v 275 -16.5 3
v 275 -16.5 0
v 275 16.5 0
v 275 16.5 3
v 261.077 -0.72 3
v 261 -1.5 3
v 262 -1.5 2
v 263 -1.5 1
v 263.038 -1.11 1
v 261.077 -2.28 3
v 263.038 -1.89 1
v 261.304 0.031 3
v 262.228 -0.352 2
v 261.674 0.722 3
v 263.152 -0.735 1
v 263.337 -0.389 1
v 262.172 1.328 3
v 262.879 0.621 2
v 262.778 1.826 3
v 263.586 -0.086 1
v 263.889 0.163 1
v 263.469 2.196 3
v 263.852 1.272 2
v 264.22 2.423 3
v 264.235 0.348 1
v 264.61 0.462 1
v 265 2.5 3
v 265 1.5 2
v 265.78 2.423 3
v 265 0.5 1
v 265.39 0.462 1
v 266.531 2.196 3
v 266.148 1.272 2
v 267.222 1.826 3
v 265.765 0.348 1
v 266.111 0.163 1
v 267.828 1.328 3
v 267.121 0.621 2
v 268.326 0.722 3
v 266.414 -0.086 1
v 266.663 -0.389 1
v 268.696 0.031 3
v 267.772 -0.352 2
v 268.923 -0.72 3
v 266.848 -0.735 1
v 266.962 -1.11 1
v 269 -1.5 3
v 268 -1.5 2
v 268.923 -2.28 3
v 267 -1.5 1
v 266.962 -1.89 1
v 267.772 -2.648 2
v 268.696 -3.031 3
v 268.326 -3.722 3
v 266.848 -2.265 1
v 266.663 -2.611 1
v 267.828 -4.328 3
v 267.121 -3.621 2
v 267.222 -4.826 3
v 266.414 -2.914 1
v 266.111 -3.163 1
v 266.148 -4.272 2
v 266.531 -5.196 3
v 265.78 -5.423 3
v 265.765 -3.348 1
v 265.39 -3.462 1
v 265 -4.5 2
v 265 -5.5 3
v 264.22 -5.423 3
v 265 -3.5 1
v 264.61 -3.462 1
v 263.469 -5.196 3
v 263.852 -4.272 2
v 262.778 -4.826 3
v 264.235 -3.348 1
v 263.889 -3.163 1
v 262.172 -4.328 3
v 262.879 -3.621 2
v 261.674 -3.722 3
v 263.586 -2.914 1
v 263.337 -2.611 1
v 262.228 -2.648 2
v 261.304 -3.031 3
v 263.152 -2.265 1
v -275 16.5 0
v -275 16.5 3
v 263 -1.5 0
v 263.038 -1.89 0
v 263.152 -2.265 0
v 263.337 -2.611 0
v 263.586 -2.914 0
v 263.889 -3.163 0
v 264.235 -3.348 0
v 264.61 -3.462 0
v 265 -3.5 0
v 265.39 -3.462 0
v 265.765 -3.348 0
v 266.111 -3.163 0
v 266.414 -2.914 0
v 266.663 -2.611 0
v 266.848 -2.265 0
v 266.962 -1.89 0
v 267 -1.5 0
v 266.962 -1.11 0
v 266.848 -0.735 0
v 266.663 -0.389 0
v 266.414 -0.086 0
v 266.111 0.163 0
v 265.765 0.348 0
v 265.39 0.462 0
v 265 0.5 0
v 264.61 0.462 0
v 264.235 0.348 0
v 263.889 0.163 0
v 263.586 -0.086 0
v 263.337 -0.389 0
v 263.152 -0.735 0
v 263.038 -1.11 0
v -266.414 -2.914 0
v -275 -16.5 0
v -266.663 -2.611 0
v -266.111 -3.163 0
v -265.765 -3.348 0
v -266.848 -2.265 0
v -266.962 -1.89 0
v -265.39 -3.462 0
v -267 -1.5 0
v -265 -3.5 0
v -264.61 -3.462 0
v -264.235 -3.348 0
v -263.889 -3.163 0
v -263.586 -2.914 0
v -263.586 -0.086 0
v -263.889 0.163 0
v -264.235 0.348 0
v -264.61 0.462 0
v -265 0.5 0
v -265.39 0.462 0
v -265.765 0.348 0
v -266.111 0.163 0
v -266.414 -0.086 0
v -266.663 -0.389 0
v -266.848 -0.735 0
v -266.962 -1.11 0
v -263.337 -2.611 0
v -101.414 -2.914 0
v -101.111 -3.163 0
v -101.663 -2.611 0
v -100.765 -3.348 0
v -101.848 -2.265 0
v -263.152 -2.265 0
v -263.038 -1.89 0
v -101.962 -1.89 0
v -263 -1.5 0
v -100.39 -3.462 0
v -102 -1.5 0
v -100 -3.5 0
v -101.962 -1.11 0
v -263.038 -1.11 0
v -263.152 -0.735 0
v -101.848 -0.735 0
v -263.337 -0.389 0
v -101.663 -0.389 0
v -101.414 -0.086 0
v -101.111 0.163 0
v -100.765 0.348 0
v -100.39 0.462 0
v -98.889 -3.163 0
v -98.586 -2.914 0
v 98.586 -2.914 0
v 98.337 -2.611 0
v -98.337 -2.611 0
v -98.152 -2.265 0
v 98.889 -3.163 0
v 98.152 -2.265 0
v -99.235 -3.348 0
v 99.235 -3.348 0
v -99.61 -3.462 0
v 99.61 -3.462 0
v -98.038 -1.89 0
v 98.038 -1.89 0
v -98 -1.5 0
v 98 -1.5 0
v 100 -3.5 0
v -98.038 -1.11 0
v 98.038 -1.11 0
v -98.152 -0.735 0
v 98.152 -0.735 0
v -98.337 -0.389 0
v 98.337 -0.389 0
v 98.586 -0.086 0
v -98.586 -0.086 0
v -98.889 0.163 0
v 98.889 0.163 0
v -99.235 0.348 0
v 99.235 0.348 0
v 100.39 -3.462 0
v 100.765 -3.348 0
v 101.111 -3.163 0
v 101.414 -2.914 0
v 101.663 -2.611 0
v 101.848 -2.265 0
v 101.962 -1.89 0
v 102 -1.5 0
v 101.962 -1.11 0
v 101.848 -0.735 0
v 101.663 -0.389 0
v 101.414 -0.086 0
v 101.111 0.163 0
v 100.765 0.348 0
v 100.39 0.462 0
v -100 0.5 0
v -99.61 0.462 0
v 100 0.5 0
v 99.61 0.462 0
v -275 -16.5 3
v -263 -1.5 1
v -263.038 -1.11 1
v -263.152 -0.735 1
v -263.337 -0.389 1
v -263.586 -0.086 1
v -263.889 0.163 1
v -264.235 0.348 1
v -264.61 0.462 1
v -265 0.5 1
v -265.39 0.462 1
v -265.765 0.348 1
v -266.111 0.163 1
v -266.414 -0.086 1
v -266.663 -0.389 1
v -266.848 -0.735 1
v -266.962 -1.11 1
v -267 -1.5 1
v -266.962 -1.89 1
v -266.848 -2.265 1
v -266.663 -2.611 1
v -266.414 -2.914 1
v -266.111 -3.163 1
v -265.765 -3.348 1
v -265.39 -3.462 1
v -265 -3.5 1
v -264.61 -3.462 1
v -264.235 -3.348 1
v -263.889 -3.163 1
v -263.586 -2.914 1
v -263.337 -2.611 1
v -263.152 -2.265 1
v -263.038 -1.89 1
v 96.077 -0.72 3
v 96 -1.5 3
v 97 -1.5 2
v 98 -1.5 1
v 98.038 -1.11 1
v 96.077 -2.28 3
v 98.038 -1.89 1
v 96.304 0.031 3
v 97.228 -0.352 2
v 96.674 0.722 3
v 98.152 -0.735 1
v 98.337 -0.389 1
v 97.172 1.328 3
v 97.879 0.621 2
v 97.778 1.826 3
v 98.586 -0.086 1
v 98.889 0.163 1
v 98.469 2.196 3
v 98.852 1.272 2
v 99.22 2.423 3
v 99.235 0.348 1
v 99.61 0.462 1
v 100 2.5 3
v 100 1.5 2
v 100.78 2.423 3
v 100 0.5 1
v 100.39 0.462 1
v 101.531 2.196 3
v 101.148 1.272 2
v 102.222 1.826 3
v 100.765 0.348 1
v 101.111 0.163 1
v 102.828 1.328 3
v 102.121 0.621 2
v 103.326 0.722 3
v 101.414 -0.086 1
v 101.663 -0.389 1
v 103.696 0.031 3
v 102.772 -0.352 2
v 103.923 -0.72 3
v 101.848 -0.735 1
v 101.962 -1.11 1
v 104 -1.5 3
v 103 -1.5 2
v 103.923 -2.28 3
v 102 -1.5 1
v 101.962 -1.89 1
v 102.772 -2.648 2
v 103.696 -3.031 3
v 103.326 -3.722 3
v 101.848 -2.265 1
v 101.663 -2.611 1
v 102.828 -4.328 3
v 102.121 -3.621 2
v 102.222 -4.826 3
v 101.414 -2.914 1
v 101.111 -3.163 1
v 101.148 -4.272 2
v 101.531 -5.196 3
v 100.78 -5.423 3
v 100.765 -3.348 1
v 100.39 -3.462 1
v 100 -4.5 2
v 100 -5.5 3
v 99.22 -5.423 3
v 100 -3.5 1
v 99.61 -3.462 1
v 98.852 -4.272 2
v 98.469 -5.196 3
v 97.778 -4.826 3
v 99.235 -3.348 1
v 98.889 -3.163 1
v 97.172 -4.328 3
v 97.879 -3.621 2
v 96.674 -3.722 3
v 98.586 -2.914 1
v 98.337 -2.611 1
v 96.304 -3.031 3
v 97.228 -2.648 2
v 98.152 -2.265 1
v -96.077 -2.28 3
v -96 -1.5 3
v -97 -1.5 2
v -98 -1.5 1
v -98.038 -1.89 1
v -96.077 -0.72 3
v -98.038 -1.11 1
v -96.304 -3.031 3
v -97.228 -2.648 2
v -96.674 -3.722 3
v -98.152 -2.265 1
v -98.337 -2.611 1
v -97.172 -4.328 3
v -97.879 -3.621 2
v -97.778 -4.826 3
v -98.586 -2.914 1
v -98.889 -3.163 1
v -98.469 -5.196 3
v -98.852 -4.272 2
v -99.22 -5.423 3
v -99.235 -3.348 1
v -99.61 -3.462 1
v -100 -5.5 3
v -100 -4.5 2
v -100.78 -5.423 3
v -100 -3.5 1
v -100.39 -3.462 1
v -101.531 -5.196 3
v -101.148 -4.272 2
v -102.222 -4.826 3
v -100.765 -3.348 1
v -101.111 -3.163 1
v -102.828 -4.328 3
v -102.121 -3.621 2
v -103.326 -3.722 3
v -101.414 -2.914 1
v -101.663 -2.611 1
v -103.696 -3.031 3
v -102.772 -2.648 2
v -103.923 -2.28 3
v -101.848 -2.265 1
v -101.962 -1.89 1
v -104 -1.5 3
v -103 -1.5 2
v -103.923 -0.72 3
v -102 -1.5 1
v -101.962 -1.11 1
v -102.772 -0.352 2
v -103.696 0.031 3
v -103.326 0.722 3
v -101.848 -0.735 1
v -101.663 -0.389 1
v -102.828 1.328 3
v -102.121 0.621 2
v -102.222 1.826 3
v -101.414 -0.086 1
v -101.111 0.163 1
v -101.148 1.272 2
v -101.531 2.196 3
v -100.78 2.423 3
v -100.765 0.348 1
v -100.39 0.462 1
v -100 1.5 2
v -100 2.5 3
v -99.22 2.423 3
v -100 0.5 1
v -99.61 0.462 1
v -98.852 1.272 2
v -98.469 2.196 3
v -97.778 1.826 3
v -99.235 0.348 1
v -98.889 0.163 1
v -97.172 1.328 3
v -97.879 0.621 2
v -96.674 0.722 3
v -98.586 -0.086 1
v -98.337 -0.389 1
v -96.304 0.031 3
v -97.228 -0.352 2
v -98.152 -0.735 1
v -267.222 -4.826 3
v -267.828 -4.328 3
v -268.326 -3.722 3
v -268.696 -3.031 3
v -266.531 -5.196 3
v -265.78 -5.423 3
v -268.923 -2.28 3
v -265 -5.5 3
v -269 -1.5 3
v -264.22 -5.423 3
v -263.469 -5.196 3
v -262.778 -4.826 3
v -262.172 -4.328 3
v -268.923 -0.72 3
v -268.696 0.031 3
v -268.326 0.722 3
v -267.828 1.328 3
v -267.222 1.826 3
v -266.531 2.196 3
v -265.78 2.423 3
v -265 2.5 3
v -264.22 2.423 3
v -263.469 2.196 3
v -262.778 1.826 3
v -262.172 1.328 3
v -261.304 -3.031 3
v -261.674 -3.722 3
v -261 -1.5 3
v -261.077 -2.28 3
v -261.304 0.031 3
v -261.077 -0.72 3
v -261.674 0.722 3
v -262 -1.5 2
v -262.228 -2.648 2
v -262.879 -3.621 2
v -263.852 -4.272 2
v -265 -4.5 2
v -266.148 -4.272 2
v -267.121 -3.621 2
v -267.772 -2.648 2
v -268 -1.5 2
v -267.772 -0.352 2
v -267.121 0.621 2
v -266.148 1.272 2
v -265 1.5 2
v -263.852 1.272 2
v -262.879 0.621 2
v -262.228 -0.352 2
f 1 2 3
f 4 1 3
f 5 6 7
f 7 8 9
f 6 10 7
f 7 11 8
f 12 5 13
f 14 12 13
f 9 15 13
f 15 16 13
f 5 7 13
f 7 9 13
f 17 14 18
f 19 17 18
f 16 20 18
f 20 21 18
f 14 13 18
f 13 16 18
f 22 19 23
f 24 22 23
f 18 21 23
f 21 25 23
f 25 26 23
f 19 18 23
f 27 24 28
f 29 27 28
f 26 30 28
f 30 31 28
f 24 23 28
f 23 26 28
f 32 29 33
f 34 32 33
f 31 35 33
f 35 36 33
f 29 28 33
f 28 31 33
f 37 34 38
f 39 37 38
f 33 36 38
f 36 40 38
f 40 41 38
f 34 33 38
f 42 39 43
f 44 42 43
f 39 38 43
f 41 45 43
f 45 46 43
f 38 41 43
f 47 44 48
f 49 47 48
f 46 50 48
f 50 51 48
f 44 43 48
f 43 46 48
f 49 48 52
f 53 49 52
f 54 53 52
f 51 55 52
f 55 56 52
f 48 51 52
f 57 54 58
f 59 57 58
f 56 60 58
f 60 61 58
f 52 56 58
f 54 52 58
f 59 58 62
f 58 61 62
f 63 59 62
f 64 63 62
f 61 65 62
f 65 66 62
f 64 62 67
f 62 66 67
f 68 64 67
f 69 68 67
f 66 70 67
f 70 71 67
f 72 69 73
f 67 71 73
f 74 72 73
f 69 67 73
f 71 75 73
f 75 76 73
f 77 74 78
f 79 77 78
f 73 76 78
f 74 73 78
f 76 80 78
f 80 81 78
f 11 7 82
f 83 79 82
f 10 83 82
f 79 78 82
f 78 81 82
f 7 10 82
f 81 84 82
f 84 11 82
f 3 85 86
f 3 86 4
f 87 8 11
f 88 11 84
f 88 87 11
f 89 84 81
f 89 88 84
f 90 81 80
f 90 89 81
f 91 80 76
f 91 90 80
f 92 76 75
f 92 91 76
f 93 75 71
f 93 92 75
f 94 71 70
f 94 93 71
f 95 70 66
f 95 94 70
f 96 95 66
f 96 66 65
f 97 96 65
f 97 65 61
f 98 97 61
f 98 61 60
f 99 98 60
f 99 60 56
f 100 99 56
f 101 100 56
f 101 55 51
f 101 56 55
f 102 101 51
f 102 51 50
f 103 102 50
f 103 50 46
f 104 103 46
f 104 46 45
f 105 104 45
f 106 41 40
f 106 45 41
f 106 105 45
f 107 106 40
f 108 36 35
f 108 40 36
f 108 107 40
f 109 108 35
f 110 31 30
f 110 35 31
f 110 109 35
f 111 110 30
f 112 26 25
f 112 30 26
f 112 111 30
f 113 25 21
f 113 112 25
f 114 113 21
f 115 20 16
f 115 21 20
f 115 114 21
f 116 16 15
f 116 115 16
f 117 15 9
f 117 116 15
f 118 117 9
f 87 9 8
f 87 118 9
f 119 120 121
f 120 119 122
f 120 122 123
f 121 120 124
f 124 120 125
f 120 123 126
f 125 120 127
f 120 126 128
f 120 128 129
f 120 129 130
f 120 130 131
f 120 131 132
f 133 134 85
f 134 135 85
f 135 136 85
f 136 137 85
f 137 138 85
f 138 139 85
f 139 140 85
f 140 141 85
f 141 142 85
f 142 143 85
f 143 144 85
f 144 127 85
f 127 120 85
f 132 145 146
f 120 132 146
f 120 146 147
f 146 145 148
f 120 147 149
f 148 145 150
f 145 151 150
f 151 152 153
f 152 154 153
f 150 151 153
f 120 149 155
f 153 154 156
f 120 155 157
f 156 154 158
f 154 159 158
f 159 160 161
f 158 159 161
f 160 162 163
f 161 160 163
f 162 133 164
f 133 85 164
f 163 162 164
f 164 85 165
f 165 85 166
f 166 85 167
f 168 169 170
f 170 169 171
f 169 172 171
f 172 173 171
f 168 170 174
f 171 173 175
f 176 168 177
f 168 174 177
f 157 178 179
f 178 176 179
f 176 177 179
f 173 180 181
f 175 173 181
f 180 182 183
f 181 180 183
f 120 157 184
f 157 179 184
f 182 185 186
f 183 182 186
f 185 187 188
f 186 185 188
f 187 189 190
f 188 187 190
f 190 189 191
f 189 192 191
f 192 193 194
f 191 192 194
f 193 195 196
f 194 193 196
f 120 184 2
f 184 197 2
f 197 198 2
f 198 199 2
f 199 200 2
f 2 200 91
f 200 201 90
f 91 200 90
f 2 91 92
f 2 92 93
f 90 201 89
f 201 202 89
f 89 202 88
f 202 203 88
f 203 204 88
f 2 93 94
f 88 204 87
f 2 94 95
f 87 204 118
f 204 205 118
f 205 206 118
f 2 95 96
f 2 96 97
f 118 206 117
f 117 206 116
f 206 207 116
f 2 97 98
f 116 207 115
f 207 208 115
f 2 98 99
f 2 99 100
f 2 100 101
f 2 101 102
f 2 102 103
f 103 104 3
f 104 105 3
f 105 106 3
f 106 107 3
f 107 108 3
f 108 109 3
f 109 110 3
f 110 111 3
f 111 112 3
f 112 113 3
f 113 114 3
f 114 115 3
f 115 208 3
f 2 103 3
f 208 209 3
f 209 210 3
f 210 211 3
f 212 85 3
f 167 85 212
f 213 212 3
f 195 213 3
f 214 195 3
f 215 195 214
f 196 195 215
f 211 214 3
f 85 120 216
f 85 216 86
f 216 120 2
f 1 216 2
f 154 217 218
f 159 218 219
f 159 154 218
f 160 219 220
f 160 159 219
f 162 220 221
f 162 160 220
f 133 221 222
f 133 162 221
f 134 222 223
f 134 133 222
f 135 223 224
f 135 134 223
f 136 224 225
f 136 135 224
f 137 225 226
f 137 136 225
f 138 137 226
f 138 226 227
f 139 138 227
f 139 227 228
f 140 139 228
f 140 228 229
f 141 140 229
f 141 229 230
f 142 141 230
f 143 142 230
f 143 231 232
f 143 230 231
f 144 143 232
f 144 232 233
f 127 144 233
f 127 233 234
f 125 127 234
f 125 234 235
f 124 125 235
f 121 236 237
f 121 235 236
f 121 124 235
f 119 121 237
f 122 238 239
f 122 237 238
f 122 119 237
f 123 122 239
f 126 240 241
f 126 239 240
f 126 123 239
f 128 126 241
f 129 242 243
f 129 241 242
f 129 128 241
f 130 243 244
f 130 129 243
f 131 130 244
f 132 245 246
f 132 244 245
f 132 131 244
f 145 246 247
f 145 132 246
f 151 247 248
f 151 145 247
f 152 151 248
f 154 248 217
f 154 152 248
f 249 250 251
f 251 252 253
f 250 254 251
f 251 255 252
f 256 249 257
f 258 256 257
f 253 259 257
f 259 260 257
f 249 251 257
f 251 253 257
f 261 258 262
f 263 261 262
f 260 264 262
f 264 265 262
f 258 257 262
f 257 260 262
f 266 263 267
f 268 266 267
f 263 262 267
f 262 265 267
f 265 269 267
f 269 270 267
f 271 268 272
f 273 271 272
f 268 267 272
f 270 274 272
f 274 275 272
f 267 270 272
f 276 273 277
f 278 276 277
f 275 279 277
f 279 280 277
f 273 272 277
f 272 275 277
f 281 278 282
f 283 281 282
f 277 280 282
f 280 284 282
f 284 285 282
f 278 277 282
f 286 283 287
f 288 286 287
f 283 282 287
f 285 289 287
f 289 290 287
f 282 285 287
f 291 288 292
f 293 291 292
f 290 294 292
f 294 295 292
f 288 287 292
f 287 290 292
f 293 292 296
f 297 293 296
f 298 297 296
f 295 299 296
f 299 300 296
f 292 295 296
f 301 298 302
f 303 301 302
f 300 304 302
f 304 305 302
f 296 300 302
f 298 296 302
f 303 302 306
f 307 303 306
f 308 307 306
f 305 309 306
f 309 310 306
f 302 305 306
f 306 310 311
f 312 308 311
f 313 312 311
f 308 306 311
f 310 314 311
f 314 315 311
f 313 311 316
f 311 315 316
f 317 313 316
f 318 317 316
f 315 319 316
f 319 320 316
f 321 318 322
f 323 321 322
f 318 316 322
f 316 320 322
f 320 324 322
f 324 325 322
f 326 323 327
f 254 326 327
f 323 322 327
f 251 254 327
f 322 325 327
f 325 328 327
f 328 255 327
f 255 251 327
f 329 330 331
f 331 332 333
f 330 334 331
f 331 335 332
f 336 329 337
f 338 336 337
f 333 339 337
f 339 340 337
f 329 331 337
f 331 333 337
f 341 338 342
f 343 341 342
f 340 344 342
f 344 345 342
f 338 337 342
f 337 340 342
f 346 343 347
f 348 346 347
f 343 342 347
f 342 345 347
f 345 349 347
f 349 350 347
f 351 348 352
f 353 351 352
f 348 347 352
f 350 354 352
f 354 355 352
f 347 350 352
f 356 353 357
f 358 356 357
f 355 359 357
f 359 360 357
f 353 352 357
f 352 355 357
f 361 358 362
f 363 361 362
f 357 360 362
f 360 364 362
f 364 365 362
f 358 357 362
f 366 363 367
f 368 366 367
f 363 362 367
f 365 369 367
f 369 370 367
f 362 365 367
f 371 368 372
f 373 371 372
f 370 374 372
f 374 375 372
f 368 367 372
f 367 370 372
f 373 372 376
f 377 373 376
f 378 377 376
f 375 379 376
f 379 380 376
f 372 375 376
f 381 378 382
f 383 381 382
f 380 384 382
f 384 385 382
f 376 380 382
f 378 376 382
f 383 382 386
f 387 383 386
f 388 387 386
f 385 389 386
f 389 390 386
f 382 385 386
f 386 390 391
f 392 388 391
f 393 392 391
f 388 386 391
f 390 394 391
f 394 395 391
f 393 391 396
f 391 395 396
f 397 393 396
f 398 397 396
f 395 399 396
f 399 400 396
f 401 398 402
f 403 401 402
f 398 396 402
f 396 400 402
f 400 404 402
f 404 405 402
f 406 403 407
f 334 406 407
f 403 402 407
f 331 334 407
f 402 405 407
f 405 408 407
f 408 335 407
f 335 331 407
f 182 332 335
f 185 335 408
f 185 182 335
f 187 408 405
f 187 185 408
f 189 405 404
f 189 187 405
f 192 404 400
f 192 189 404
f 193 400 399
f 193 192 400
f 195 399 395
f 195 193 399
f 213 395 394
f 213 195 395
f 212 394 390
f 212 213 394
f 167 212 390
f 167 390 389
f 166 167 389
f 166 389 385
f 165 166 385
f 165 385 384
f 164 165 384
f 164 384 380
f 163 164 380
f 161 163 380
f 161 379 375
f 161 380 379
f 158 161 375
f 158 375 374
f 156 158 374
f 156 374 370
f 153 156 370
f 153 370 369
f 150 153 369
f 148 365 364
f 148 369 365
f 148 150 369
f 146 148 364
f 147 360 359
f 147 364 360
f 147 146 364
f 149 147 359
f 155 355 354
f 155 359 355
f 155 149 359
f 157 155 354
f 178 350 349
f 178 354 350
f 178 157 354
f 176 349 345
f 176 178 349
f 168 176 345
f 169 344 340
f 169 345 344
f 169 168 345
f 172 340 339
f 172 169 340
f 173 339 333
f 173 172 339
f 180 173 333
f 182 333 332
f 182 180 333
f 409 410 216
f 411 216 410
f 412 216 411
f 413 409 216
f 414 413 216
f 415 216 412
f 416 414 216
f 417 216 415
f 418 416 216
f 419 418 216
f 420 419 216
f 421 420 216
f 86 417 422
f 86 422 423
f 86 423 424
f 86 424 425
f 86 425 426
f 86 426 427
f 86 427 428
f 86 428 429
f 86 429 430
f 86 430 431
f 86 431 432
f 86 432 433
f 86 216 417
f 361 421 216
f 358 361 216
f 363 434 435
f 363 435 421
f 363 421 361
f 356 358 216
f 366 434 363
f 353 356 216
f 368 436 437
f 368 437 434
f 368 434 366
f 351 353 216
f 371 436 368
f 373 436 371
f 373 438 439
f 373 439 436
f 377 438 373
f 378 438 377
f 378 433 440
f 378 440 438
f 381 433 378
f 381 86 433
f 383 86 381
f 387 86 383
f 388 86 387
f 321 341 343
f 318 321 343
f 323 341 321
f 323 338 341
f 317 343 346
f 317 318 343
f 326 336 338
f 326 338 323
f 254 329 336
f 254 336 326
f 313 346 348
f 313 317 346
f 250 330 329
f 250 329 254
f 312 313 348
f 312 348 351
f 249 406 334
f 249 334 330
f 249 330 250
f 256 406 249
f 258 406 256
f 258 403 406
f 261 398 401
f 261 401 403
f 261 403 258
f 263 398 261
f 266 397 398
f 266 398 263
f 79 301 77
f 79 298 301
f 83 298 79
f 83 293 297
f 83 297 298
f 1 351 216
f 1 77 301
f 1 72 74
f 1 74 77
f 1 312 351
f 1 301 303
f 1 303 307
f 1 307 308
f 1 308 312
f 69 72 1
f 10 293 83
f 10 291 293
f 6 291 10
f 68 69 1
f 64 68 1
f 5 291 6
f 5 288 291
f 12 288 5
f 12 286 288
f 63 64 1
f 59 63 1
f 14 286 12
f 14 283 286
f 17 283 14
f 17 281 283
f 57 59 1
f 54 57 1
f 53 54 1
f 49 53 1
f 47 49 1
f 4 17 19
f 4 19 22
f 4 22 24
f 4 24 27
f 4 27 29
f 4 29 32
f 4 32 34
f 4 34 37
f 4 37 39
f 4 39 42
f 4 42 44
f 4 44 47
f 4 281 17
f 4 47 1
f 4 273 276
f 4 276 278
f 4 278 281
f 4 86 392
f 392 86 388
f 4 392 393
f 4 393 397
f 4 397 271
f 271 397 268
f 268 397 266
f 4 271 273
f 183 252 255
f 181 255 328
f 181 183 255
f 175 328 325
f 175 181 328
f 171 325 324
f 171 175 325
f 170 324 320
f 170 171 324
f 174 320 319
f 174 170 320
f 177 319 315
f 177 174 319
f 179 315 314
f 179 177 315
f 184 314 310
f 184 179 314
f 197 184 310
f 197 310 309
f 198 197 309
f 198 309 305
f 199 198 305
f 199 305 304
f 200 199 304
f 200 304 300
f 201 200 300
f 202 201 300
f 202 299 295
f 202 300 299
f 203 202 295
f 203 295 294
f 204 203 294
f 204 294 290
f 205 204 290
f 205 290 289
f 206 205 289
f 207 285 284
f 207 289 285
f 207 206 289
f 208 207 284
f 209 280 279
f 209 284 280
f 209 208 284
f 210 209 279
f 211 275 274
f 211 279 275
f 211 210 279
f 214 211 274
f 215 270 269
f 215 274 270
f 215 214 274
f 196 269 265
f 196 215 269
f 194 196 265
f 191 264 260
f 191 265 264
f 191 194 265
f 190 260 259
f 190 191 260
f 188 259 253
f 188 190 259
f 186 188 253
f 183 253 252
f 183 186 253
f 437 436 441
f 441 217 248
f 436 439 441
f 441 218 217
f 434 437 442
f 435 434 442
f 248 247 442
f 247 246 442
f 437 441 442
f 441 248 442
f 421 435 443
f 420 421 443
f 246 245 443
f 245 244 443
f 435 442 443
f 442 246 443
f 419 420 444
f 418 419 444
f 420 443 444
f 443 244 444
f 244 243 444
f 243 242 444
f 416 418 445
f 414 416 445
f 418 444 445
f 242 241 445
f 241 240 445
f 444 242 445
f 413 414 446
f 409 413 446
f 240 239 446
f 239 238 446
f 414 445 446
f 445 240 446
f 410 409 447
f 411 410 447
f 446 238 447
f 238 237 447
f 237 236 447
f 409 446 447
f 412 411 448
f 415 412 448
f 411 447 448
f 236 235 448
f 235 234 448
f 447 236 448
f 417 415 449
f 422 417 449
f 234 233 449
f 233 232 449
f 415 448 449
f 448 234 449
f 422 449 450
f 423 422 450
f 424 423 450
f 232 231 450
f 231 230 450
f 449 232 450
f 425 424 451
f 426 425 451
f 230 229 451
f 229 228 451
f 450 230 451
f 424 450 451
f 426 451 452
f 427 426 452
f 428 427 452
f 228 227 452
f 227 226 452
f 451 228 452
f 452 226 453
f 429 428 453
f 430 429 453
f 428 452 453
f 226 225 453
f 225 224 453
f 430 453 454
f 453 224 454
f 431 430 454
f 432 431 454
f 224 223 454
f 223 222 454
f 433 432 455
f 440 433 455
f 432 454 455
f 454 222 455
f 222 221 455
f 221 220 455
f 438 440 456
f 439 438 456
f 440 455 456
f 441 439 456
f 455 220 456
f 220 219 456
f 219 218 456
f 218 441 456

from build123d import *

# Parameters (mm, degrees)
SKETCH_1_W          = 550
SKETCH_1_H          = 33
EXTRUDE_1_DEPTH     = 3
SKETCH_2_R          = 2
CUT_EXTRUDE_2_DEPTH = 276.510889077
CHAMFER_1_SIZE      = 2


with BuildPart() as part:
    # 草图1 → 凸台-拉伸1 (new body)
    with BuildSketch(Plane.XY):
        Rectangle(SKETCH_1_W, SKETCH_1_H)
    extrude(amount=EXTRUDE_1_DEPTH)

    # 草图2 → 切除-拉伸2 (cut, through all)
    with BuildSketch(Plane.XY):
        with Locations((-265, -1.5)):
            Circle(SKETCH_2_R)
        with Locations((-100, -1.5)):
            Circle(SKETCH_2_R)
        with Locations(Location((100, -1.5, 0), (0, 0, 180))):
            Circle(SKETCH_2_R)
        with Locations(Location((265, -1.5, 0), (0, 0, 180))):
            Circle(SKETCH_2_R)
    extrude(amount=CUT_EXTRUDE_2_DEPTH, mode=Mode.SUBTRACT)

    # 倒角1
    chamfer_1_edges = [part.edges().sort_by_distance(p)[0] for p in [
        (-267, -1.5, 3),
        (-102, -1.5, 3),
        (102, -1.5, 3),
        (267, -1.5, 3),
    ]]
    chamfer(chamfer_1_edges, length=CHAMFER_1_SIZE)


solid = part.part
